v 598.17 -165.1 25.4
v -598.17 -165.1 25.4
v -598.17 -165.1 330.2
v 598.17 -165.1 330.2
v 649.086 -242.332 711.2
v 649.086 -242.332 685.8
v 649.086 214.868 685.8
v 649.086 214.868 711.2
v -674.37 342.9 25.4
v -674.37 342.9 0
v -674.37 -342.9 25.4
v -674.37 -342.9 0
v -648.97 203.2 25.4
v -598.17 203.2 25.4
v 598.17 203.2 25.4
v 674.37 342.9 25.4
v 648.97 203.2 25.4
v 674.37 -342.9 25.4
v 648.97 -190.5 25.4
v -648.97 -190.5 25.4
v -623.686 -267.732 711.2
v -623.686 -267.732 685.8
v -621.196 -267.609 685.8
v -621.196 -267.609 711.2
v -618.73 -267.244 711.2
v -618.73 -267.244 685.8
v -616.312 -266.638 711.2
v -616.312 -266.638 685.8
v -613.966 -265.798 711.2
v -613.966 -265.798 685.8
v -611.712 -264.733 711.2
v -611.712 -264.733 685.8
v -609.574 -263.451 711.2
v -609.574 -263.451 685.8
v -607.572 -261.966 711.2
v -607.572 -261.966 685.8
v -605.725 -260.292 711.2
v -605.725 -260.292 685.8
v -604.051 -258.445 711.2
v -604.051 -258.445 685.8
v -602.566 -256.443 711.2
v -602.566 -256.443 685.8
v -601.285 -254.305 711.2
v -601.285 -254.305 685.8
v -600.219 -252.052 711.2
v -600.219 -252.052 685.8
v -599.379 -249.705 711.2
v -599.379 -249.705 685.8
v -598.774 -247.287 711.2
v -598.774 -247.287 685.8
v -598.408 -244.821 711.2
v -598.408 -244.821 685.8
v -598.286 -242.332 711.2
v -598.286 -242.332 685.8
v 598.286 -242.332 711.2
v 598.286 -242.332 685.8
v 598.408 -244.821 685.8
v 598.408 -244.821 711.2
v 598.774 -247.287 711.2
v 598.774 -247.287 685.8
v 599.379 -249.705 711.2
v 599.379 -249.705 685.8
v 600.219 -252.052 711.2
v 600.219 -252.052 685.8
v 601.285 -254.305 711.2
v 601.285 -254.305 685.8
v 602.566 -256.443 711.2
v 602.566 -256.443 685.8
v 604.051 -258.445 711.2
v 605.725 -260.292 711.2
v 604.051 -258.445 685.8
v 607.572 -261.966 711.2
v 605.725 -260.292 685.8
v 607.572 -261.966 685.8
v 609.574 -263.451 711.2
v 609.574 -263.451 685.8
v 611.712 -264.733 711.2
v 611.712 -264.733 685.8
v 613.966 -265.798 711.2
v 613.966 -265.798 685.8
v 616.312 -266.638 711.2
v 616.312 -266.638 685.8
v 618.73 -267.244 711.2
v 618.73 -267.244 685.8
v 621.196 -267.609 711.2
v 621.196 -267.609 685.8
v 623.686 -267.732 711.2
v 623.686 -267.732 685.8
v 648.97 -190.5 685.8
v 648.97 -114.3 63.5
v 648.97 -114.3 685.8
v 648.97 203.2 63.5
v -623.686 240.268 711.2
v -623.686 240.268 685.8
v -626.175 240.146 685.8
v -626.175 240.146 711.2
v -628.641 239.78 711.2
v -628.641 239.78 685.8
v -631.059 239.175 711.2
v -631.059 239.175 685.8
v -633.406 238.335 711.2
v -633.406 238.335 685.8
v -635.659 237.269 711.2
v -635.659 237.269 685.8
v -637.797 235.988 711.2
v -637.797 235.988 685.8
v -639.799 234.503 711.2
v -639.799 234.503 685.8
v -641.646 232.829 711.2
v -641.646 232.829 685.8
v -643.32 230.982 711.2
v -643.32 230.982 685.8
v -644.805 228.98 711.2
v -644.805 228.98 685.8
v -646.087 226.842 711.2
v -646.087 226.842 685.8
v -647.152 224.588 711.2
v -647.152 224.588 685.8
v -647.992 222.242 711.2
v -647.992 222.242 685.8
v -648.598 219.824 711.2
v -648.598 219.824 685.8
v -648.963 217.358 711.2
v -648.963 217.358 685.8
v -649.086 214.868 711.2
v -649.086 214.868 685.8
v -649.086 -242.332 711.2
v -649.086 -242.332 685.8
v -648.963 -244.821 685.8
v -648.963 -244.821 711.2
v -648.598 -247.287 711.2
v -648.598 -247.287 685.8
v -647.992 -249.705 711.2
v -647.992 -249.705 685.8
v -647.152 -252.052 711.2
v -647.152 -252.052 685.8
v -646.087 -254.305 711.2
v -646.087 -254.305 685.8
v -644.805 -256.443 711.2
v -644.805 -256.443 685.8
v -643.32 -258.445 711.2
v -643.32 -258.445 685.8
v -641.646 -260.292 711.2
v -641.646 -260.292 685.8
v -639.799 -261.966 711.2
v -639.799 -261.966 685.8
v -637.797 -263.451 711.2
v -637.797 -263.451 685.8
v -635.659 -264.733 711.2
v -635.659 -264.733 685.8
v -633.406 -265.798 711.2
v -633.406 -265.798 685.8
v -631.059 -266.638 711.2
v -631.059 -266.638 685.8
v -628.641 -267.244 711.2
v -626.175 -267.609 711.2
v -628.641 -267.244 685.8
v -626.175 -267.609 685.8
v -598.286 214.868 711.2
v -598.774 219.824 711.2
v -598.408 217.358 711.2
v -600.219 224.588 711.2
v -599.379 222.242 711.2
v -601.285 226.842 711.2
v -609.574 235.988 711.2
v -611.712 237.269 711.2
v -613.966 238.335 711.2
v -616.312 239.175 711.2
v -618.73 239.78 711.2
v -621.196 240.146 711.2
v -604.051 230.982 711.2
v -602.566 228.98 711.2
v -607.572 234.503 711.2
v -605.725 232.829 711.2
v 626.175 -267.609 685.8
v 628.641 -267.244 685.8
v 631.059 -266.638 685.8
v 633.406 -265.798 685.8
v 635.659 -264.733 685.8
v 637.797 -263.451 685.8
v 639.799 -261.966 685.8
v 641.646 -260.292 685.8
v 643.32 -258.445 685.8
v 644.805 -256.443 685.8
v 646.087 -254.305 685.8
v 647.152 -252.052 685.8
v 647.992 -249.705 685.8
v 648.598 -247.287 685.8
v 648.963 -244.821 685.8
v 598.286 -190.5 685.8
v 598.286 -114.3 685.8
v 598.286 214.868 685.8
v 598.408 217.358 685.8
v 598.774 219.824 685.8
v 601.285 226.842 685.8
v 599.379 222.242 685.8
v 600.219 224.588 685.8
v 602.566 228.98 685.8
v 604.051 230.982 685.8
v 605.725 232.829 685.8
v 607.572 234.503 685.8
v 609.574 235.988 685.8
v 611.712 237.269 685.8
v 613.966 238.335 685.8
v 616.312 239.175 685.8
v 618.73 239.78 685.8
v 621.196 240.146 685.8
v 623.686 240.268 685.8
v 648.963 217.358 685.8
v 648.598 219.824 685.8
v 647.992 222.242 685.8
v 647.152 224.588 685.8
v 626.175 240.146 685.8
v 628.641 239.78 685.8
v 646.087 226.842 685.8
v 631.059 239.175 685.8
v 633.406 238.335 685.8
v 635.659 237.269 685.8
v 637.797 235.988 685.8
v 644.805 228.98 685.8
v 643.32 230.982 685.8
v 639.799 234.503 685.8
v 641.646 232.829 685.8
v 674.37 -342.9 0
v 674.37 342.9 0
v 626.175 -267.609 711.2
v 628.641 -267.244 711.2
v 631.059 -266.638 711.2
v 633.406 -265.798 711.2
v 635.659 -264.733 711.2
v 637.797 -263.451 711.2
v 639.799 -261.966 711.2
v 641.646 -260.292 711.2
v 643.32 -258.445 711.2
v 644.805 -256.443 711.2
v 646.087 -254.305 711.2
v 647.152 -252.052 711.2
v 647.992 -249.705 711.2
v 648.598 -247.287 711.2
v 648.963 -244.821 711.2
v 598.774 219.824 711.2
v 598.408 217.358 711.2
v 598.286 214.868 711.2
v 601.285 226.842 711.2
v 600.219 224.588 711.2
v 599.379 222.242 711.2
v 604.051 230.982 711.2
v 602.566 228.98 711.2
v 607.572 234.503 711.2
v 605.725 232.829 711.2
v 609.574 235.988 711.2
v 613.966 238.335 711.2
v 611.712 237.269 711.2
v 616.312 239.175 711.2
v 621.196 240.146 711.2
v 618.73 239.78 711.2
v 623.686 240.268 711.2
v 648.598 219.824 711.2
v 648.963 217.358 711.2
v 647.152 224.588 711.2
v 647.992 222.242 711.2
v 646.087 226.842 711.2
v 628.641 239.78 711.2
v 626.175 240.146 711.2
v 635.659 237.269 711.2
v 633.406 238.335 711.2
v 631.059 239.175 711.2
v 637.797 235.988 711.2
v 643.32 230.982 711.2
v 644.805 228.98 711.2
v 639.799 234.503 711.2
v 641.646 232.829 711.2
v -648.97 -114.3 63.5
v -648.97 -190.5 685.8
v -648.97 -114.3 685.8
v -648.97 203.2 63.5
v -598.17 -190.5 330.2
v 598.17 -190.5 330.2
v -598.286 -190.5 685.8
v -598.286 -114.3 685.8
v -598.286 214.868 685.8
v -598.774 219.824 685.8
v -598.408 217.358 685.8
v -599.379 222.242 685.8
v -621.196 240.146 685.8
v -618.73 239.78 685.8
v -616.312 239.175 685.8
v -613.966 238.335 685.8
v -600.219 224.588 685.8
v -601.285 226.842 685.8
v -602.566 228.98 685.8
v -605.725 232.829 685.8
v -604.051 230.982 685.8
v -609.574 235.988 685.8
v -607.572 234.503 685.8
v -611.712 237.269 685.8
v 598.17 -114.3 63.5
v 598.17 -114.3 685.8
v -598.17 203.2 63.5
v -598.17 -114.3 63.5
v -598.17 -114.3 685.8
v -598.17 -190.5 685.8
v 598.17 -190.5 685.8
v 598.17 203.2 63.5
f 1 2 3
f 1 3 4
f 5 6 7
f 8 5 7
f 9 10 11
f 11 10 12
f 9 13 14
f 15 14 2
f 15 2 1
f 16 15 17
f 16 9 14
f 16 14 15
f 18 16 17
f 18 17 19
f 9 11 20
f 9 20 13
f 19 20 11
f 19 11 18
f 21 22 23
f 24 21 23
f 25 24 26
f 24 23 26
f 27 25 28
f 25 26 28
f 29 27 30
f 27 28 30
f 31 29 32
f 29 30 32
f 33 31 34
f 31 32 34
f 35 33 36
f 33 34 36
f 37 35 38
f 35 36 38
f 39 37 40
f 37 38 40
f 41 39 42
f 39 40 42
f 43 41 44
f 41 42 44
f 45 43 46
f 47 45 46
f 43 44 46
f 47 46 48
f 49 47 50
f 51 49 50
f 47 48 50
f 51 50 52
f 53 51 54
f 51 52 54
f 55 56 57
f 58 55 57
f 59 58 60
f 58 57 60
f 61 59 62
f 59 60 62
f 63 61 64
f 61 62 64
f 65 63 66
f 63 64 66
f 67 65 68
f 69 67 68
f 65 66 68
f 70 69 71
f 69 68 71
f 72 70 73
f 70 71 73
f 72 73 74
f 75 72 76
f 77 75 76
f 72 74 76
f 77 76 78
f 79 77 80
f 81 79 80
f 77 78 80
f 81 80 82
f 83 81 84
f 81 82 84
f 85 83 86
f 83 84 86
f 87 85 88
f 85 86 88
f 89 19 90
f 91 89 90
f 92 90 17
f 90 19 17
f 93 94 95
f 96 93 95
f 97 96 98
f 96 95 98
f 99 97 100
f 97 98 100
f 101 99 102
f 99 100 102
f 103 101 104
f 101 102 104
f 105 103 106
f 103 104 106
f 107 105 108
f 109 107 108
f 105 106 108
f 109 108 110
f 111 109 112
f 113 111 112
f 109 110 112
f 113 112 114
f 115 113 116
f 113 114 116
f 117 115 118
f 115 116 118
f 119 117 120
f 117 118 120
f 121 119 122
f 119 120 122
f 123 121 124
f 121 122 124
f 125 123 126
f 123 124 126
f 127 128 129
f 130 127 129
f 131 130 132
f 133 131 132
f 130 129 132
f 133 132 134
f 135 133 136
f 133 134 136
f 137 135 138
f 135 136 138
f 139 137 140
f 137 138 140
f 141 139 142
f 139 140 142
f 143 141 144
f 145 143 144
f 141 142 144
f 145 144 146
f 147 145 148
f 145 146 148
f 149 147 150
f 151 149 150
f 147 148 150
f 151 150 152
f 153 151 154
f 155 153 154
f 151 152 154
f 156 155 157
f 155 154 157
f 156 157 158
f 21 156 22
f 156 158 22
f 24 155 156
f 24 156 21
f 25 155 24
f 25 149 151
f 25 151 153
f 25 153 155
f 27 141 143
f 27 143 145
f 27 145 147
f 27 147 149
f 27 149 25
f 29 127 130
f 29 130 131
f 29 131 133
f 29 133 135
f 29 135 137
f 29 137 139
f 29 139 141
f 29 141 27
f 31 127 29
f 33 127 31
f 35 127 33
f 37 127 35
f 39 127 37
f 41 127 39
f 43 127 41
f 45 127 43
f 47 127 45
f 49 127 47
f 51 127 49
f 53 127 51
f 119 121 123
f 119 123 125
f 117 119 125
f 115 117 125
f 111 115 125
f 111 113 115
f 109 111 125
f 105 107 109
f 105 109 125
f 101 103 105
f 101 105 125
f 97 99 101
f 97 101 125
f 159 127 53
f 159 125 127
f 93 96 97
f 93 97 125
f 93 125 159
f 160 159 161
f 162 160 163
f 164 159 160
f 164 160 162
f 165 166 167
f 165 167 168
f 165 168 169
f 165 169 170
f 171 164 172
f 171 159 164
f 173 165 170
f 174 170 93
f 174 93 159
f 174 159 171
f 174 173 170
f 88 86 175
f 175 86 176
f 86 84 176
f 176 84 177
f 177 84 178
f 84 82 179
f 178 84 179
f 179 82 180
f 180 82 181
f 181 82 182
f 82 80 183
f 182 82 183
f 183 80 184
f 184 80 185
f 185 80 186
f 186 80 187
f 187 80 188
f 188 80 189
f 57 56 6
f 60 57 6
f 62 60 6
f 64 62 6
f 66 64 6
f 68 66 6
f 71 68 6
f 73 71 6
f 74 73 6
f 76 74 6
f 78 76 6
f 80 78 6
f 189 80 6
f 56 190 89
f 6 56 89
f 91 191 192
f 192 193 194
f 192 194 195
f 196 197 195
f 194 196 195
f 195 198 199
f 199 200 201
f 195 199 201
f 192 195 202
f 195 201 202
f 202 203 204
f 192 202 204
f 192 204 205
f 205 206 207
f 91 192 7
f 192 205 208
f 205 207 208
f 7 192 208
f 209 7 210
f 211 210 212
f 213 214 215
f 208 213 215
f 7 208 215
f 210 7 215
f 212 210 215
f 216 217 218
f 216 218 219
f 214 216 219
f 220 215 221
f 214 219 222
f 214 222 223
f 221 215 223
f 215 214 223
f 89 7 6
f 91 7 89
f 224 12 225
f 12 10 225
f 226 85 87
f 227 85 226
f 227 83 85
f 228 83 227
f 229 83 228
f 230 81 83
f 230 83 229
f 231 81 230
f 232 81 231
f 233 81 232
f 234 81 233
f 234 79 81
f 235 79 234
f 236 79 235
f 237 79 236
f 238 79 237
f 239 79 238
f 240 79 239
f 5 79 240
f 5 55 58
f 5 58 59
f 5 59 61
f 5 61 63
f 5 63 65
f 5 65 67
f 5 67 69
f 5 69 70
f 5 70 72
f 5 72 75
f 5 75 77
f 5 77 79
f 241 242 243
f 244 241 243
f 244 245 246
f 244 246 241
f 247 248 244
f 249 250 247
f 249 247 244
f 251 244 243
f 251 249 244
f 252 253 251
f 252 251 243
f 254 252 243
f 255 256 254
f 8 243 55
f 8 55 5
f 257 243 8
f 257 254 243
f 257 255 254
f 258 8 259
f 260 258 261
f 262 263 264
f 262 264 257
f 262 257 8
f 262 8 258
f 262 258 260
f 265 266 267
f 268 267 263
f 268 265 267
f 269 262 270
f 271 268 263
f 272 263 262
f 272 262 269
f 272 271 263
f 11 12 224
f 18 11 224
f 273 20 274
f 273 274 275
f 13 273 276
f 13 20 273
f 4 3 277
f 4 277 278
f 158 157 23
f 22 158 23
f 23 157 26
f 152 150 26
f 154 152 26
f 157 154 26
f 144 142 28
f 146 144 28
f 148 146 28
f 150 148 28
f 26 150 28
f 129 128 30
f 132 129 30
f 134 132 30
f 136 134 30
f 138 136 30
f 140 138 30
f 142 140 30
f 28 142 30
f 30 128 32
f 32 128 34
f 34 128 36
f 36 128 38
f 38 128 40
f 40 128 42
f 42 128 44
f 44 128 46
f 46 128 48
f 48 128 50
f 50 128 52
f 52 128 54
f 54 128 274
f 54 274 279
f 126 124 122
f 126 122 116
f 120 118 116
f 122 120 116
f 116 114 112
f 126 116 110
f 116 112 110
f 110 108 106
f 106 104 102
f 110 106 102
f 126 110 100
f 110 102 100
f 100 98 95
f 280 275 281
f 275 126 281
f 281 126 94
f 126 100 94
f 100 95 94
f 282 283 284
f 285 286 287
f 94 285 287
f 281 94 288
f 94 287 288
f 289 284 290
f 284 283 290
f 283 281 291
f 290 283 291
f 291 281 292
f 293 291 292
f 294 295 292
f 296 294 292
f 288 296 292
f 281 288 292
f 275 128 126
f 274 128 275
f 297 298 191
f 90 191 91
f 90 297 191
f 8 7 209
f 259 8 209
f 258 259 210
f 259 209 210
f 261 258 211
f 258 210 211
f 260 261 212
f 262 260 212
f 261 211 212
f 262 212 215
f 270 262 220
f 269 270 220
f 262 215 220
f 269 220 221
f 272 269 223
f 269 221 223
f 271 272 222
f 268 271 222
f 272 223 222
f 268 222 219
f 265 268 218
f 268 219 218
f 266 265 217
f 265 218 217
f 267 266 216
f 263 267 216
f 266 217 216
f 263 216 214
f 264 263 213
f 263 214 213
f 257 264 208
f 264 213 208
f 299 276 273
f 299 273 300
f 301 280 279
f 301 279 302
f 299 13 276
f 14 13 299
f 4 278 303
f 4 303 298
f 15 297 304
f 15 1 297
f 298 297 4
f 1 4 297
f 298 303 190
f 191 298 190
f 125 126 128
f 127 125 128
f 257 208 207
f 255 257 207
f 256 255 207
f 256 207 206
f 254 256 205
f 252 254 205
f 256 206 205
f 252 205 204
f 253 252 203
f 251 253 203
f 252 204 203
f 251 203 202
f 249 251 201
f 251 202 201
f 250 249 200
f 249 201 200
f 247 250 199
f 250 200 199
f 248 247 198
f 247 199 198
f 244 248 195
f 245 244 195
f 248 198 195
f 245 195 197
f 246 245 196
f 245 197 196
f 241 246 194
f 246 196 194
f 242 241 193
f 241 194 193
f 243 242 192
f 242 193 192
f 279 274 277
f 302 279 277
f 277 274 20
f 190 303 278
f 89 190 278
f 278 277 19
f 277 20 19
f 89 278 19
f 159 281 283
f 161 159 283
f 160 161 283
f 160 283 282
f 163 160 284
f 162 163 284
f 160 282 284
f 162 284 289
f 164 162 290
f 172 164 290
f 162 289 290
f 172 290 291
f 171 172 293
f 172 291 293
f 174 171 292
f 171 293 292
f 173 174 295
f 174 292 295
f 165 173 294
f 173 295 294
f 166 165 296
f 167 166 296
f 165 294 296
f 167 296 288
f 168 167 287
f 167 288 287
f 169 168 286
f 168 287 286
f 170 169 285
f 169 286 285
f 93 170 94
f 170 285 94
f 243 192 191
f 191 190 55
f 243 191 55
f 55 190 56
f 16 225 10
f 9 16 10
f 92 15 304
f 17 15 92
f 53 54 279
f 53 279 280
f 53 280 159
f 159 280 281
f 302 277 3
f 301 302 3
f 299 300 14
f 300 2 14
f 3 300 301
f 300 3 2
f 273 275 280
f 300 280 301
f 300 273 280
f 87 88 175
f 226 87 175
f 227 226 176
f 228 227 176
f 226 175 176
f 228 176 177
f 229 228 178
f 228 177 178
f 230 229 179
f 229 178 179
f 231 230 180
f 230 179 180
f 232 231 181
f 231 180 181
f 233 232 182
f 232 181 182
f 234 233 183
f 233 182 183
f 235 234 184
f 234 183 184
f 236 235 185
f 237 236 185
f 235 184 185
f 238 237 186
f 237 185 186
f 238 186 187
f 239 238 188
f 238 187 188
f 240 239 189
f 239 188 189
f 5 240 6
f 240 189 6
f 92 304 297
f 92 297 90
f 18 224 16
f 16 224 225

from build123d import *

# Parameters (mm, degrees)
F1_DEPTH = 25.4
F2_W     = 50.8
F2_H     = 317.5
F3_DEPTH = 38.1
F4_W     = 50.8
F4_H     = 76.2
F5_DEPTH = 660.4
F7_DEPTH = 25.4
F8_W     = 1196.34
F8_H     = 25.4
F9_DEPTH = 304.8


# Not quite as in the source:
# - a feature names something its author has since deleted; it is built from what else it names


with BuildPart() as f1:
    # F0 (on Top) → F1 (new body)
    with BuildSketch(Plane.XY):
        Polygon((-674.37, -342.9), (674.37, -342.9), (674.37, 342.9), (-674.37, 342.9), (-674.37, -114.3), align=None)
    extrude(amount=F1_DEPTH)

    # F2 (on face) → F3 (join)
    with BuildSketch(Plane.XY.offset(25.4)):
        with Locations((-623.57, 44.45)):
            Rectangle(F2_W, F2_H)
        with Locations((623.57, 44.45)):
            Rectangle(F2_W, F2_H)
    extrude(amount=F3_DEPTH)

    # F4 (on face) → F5 (join)
    with BuildSketch(Plane.XY.offset(25.4)):
        with Locations((-623.57, -152.4)):
            Rectangle(F4_W, F4_H)
        with Locations((623.57, -152.4)):
            Rectangle(F4_W, F4_H)
    extrude(amount=F5_DEPTH)

    # F6 (on face) → F7 (join)
    with BuildSketch(Plane.XY.offset(685.8)):
        with BuildLine():
            ThreePointArc((-623.6857005119, -267.7317205817), (-605.7251882698, -260.2922328238), (-598.2857005119, -242.3317205817))
            Line((-598.2857005119, -242.3317205817), (-598.2857005119, 214.8682794183))
            ThreePointArc((-598.2857005119, 214.8682794183), (-605.7251882698, 232.8287916605), (-623.6857005119, 240.2682794183))
            ThreePointArc((-623.6857005119, 240.2682794183), (-641.6462127541, 232.8287916605), (-649.0857005119, 214.8682794183))
            Line((-649.0857005119, 214.8682794183), (-649.0857005119, -242.3317205817))
            ThreePointArc((-649.0857005119, -242.3317205817), (-641.6462127541, -260.2922328238), (-623.6857005119, -267.7317205817))
        make_face()
        with BuildLine():
            ThreePointArc((623.6857005119, -267.7317205817), (641.6462127541, -260.2922328238), (649.0857005119, -242.3317205817))
            Line((649.0857005119, -242.3317205817), (649.0857005119, 214.8682794183))
            ThreePointArc((649.0857005119, 214.8682794183), (641.6462127541, 232.8287916605), (623.6857005119, 240.2682794183))
            ThreePointArc((623.6857005119, 240.2682794183), (605.7251882698, 232.8287916605), (598.2857005119, 214.8682794183))
            Line((598.2857005119, 214.8682794183), (598.2857005119, -242.3317205817))
            ThreePointArc((598.2857005119, -242.3317205817), (605.7251882698, -260.2922328238), (623.6857005119, -267.7317205817))
        make_face()
    extrude(amount=F7_DEPTH)

    # F8 (on face) → F9 (join)
    with BuildSketch(Plane.XY.offset(25.4)):
        with Locations((0, -177.8)):
            Rectangle(F8_W, F8_H)
    extrude(amount=F9_DEPTH)


solid = f1.part
